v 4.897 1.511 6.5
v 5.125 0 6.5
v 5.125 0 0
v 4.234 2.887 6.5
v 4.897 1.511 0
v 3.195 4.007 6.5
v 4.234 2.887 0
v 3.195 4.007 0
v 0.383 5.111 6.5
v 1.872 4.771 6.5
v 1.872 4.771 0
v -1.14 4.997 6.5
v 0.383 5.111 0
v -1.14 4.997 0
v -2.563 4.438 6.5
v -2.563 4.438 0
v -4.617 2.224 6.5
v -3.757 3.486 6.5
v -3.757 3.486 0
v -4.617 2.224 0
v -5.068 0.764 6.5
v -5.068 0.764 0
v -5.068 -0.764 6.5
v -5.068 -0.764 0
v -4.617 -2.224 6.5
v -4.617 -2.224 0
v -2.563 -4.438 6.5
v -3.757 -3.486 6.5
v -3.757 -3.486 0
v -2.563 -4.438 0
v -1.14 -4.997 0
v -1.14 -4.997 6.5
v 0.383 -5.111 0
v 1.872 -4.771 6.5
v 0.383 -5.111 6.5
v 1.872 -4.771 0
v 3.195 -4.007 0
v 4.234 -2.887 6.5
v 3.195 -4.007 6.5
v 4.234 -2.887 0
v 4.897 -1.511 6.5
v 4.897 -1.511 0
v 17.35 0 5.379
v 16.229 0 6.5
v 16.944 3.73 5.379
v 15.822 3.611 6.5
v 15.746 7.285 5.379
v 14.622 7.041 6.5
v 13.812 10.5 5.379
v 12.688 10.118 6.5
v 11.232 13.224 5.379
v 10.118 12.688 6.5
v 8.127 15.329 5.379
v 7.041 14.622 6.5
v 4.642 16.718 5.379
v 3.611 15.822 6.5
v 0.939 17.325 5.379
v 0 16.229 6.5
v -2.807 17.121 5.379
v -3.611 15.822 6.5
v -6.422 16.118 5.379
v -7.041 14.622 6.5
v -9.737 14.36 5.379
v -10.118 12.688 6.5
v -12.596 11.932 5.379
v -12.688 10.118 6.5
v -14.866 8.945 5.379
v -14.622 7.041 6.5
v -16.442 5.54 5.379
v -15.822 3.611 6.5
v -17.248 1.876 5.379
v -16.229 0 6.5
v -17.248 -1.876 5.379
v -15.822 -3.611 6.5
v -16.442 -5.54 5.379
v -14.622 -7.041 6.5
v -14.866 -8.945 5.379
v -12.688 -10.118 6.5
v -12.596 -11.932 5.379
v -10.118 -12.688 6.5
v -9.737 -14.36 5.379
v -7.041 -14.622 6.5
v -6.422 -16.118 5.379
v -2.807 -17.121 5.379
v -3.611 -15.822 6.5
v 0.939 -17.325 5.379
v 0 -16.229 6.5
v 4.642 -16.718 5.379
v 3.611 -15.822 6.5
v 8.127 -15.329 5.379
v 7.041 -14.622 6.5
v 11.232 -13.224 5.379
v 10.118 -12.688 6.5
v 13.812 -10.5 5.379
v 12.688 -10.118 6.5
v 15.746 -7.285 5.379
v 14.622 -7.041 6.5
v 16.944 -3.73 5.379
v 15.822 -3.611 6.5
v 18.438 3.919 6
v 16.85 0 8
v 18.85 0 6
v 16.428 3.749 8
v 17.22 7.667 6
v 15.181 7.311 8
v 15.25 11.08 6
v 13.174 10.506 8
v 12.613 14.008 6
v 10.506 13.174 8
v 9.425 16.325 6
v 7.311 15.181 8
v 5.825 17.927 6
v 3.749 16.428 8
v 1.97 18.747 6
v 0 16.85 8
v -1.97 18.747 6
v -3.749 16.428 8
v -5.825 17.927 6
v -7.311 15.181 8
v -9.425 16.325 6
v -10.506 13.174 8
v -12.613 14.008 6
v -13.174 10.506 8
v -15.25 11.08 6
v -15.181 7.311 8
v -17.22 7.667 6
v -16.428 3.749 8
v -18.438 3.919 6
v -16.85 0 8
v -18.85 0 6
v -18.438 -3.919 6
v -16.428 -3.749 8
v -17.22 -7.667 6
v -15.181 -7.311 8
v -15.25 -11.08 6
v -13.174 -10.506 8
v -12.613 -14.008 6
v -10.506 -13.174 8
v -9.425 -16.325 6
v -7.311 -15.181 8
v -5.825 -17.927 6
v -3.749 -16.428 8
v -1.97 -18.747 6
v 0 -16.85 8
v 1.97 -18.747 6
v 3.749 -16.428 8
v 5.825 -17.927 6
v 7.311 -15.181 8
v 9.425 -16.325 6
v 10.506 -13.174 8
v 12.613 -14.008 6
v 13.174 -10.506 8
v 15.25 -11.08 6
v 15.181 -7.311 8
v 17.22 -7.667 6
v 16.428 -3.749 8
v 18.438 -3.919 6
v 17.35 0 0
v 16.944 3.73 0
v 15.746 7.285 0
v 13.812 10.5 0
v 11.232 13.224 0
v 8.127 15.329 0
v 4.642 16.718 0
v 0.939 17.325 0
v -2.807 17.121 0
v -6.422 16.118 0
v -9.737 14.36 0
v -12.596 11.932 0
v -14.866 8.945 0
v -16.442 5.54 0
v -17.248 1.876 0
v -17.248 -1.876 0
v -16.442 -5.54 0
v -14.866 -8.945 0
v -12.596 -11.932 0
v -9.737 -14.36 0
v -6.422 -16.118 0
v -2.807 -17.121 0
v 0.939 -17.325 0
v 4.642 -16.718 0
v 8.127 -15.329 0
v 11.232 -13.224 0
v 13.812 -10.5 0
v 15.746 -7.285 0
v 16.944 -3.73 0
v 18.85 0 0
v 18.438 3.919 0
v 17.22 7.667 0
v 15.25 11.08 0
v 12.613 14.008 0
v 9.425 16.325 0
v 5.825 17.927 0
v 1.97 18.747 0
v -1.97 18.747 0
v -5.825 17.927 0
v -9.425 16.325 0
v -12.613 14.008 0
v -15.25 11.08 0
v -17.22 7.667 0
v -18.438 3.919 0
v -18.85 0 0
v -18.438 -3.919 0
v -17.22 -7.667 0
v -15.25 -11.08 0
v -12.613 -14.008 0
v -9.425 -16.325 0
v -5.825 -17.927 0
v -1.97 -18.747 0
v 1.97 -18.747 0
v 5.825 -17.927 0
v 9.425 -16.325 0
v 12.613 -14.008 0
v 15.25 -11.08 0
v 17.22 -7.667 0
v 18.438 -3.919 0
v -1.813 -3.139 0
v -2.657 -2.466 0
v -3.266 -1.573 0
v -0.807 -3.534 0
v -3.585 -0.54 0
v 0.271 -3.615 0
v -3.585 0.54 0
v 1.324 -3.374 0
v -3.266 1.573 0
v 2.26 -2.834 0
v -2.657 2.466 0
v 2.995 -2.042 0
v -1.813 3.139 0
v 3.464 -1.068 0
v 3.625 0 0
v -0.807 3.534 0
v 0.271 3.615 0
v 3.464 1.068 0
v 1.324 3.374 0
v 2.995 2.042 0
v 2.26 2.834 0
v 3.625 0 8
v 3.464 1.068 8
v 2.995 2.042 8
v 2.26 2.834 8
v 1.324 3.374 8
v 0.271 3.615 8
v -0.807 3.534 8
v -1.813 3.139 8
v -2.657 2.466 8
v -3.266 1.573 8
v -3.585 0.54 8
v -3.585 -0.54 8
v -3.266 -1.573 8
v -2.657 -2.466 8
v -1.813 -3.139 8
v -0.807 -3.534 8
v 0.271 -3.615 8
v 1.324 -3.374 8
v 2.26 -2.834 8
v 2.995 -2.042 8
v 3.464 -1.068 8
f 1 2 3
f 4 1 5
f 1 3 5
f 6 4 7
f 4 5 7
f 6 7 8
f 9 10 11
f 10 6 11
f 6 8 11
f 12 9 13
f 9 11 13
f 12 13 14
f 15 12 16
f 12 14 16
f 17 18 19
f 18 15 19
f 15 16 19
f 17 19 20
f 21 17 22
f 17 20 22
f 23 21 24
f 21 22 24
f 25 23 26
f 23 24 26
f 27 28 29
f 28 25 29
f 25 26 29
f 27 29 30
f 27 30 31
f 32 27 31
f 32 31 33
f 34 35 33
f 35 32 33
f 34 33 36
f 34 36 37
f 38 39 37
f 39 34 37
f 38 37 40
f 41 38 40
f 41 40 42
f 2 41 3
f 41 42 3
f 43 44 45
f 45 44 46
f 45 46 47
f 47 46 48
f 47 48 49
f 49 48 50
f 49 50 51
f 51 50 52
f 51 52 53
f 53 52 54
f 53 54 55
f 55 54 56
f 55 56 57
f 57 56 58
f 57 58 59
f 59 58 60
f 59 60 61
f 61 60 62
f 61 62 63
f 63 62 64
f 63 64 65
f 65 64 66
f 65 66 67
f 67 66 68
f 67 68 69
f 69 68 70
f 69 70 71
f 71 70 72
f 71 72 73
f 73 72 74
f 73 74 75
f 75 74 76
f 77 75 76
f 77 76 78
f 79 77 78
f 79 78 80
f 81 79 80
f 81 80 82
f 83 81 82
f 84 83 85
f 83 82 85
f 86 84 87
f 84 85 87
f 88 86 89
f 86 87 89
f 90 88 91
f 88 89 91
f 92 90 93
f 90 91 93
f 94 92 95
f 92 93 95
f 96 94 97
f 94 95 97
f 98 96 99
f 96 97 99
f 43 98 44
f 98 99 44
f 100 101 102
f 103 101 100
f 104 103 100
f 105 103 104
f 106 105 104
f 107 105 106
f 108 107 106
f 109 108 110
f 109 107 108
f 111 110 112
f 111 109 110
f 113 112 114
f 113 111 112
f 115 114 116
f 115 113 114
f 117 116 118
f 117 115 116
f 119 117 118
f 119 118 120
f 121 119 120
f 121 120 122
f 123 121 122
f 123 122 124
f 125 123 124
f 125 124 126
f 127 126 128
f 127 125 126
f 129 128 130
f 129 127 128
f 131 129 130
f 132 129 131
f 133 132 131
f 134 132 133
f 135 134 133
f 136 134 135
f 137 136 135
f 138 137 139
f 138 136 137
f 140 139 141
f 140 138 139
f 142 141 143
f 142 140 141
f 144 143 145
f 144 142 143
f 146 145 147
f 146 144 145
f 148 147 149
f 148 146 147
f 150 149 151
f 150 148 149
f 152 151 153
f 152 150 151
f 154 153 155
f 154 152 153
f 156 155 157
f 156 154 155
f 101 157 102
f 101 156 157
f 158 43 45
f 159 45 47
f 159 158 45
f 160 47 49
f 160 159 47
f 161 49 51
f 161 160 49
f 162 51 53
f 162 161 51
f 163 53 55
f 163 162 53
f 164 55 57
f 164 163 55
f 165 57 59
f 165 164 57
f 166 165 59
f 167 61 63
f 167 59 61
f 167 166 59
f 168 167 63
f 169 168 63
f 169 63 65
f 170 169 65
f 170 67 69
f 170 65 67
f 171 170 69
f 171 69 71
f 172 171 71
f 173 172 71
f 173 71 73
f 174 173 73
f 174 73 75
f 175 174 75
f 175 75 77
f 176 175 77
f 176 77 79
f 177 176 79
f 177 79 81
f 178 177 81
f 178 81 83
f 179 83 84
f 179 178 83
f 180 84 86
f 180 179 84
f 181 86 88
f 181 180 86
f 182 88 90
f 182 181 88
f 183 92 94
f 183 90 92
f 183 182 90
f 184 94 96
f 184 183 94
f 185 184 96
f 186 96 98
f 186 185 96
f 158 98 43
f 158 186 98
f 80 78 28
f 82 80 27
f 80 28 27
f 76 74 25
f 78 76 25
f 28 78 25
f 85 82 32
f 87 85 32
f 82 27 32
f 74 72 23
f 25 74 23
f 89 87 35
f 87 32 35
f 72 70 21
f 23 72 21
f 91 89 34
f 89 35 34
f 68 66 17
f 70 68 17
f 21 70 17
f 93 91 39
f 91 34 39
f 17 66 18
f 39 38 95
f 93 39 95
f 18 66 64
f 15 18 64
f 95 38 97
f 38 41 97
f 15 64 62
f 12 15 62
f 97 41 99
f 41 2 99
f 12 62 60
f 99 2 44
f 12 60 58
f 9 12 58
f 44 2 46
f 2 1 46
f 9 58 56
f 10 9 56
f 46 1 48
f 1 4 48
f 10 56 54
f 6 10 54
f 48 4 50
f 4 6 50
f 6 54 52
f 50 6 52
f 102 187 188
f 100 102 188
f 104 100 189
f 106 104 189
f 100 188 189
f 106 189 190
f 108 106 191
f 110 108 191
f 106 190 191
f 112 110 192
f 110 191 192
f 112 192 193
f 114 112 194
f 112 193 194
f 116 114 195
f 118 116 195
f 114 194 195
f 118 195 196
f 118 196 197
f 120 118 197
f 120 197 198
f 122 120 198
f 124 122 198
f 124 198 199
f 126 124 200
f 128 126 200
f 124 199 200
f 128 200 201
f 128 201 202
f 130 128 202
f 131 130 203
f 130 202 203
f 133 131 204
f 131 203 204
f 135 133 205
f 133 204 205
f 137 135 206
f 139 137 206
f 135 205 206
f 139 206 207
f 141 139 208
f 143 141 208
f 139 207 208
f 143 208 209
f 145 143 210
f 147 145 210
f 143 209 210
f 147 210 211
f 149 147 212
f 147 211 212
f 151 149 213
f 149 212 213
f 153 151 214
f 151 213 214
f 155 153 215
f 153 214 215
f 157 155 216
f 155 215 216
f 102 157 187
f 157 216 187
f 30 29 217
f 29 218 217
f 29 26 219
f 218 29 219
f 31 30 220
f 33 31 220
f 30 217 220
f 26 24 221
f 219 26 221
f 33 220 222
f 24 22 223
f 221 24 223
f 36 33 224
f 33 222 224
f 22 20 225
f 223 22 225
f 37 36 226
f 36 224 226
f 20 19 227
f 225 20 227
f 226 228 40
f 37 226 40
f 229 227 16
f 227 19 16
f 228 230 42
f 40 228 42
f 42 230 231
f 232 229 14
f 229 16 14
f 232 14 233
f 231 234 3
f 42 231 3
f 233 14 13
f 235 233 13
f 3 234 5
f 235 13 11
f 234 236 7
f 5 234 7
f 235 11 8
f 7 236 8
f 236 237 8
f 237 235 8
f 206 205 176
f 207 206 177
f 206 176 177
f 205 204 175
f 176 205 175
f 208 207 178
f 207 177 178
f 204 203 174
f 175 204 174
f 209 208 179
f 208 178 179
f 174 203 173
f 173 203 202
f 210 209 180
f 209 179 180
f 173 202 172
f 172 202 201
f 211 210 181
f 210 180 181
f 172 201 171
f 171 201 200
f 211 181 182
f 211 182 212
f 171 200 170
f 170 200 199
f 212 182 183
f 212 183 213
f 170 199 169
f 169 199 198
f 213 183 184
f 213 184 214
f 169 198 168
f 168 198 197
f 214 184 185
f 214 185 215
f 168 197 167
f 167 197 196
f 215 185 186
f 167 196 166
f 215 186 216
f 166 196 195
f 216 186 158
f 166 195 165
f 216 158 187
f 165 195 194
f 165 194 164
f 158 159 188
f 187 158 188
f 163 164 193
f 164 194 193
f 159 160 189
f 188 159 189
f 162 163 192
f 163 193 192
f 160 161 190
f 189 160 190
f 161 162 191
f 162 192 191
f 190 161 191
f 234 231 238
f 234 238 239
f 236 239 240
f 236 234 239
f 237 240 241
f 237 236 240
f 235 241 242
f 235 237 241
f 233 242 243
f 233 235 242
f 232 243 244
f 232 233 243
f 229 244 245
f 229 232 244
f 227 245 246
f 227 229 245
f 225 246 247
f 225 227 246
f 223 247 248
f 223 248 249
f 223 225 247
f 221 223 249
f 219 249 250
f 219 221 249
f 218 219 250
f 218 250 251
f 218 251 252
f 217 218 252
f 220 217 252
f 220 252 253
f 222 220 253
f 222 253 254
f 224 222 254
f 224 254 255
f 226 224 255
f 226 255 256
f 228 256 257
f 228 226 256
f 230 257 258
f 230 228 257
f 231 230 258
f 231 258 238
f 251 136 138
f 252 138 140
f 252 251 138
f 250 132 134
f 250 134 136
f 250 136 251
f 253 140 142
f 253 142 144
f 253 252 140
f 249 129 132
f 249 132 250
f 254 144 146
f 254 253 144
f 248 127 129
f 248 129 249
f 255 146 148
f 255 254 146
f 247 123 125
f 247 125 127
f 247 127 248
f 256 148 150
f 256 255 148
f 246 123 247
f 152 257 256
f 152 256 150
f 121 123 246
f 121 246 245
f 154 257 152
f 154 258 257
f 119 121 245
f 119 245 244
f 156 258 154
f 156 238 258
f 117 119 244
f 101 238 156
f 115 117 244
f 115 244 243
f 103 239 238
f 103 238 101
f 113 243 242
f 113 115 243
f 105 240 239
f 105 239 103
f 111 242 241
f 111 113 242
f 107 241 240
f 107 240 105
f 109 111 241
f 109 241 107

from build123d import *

# Parameters (mm, degrees)
F0_R     = 18.85
F0_R_2   = 3.625
F1_DEPTH = 8
F2_SIZE  = 2
F3_T     = -1.5


with BuildPart() as f1:
    # F0 (on Top) → F1 (new body)
    with BuildSketch(Plane.XY):
        Circle(F0_R)
        Circle(F0_R_2, mode=Mode.SUBTRACT)
    extrude(amount=F1_DEPTH)

    # F2
    f2_edges = [f1.edges().sort_by_distance(p)[0] for p in [
        (-18.85, 0, 8),
    ]]
    chamfer(f2_edges, length=F2_SIZE)

    # F3
    f3_openings = [f1.faces().sort_by_distance(p)[0] for p in [
        (-18.316841, 0, 0),
    ]]
    offset(amount=F3_T, openings=f3_openings)


solid = f1.part
